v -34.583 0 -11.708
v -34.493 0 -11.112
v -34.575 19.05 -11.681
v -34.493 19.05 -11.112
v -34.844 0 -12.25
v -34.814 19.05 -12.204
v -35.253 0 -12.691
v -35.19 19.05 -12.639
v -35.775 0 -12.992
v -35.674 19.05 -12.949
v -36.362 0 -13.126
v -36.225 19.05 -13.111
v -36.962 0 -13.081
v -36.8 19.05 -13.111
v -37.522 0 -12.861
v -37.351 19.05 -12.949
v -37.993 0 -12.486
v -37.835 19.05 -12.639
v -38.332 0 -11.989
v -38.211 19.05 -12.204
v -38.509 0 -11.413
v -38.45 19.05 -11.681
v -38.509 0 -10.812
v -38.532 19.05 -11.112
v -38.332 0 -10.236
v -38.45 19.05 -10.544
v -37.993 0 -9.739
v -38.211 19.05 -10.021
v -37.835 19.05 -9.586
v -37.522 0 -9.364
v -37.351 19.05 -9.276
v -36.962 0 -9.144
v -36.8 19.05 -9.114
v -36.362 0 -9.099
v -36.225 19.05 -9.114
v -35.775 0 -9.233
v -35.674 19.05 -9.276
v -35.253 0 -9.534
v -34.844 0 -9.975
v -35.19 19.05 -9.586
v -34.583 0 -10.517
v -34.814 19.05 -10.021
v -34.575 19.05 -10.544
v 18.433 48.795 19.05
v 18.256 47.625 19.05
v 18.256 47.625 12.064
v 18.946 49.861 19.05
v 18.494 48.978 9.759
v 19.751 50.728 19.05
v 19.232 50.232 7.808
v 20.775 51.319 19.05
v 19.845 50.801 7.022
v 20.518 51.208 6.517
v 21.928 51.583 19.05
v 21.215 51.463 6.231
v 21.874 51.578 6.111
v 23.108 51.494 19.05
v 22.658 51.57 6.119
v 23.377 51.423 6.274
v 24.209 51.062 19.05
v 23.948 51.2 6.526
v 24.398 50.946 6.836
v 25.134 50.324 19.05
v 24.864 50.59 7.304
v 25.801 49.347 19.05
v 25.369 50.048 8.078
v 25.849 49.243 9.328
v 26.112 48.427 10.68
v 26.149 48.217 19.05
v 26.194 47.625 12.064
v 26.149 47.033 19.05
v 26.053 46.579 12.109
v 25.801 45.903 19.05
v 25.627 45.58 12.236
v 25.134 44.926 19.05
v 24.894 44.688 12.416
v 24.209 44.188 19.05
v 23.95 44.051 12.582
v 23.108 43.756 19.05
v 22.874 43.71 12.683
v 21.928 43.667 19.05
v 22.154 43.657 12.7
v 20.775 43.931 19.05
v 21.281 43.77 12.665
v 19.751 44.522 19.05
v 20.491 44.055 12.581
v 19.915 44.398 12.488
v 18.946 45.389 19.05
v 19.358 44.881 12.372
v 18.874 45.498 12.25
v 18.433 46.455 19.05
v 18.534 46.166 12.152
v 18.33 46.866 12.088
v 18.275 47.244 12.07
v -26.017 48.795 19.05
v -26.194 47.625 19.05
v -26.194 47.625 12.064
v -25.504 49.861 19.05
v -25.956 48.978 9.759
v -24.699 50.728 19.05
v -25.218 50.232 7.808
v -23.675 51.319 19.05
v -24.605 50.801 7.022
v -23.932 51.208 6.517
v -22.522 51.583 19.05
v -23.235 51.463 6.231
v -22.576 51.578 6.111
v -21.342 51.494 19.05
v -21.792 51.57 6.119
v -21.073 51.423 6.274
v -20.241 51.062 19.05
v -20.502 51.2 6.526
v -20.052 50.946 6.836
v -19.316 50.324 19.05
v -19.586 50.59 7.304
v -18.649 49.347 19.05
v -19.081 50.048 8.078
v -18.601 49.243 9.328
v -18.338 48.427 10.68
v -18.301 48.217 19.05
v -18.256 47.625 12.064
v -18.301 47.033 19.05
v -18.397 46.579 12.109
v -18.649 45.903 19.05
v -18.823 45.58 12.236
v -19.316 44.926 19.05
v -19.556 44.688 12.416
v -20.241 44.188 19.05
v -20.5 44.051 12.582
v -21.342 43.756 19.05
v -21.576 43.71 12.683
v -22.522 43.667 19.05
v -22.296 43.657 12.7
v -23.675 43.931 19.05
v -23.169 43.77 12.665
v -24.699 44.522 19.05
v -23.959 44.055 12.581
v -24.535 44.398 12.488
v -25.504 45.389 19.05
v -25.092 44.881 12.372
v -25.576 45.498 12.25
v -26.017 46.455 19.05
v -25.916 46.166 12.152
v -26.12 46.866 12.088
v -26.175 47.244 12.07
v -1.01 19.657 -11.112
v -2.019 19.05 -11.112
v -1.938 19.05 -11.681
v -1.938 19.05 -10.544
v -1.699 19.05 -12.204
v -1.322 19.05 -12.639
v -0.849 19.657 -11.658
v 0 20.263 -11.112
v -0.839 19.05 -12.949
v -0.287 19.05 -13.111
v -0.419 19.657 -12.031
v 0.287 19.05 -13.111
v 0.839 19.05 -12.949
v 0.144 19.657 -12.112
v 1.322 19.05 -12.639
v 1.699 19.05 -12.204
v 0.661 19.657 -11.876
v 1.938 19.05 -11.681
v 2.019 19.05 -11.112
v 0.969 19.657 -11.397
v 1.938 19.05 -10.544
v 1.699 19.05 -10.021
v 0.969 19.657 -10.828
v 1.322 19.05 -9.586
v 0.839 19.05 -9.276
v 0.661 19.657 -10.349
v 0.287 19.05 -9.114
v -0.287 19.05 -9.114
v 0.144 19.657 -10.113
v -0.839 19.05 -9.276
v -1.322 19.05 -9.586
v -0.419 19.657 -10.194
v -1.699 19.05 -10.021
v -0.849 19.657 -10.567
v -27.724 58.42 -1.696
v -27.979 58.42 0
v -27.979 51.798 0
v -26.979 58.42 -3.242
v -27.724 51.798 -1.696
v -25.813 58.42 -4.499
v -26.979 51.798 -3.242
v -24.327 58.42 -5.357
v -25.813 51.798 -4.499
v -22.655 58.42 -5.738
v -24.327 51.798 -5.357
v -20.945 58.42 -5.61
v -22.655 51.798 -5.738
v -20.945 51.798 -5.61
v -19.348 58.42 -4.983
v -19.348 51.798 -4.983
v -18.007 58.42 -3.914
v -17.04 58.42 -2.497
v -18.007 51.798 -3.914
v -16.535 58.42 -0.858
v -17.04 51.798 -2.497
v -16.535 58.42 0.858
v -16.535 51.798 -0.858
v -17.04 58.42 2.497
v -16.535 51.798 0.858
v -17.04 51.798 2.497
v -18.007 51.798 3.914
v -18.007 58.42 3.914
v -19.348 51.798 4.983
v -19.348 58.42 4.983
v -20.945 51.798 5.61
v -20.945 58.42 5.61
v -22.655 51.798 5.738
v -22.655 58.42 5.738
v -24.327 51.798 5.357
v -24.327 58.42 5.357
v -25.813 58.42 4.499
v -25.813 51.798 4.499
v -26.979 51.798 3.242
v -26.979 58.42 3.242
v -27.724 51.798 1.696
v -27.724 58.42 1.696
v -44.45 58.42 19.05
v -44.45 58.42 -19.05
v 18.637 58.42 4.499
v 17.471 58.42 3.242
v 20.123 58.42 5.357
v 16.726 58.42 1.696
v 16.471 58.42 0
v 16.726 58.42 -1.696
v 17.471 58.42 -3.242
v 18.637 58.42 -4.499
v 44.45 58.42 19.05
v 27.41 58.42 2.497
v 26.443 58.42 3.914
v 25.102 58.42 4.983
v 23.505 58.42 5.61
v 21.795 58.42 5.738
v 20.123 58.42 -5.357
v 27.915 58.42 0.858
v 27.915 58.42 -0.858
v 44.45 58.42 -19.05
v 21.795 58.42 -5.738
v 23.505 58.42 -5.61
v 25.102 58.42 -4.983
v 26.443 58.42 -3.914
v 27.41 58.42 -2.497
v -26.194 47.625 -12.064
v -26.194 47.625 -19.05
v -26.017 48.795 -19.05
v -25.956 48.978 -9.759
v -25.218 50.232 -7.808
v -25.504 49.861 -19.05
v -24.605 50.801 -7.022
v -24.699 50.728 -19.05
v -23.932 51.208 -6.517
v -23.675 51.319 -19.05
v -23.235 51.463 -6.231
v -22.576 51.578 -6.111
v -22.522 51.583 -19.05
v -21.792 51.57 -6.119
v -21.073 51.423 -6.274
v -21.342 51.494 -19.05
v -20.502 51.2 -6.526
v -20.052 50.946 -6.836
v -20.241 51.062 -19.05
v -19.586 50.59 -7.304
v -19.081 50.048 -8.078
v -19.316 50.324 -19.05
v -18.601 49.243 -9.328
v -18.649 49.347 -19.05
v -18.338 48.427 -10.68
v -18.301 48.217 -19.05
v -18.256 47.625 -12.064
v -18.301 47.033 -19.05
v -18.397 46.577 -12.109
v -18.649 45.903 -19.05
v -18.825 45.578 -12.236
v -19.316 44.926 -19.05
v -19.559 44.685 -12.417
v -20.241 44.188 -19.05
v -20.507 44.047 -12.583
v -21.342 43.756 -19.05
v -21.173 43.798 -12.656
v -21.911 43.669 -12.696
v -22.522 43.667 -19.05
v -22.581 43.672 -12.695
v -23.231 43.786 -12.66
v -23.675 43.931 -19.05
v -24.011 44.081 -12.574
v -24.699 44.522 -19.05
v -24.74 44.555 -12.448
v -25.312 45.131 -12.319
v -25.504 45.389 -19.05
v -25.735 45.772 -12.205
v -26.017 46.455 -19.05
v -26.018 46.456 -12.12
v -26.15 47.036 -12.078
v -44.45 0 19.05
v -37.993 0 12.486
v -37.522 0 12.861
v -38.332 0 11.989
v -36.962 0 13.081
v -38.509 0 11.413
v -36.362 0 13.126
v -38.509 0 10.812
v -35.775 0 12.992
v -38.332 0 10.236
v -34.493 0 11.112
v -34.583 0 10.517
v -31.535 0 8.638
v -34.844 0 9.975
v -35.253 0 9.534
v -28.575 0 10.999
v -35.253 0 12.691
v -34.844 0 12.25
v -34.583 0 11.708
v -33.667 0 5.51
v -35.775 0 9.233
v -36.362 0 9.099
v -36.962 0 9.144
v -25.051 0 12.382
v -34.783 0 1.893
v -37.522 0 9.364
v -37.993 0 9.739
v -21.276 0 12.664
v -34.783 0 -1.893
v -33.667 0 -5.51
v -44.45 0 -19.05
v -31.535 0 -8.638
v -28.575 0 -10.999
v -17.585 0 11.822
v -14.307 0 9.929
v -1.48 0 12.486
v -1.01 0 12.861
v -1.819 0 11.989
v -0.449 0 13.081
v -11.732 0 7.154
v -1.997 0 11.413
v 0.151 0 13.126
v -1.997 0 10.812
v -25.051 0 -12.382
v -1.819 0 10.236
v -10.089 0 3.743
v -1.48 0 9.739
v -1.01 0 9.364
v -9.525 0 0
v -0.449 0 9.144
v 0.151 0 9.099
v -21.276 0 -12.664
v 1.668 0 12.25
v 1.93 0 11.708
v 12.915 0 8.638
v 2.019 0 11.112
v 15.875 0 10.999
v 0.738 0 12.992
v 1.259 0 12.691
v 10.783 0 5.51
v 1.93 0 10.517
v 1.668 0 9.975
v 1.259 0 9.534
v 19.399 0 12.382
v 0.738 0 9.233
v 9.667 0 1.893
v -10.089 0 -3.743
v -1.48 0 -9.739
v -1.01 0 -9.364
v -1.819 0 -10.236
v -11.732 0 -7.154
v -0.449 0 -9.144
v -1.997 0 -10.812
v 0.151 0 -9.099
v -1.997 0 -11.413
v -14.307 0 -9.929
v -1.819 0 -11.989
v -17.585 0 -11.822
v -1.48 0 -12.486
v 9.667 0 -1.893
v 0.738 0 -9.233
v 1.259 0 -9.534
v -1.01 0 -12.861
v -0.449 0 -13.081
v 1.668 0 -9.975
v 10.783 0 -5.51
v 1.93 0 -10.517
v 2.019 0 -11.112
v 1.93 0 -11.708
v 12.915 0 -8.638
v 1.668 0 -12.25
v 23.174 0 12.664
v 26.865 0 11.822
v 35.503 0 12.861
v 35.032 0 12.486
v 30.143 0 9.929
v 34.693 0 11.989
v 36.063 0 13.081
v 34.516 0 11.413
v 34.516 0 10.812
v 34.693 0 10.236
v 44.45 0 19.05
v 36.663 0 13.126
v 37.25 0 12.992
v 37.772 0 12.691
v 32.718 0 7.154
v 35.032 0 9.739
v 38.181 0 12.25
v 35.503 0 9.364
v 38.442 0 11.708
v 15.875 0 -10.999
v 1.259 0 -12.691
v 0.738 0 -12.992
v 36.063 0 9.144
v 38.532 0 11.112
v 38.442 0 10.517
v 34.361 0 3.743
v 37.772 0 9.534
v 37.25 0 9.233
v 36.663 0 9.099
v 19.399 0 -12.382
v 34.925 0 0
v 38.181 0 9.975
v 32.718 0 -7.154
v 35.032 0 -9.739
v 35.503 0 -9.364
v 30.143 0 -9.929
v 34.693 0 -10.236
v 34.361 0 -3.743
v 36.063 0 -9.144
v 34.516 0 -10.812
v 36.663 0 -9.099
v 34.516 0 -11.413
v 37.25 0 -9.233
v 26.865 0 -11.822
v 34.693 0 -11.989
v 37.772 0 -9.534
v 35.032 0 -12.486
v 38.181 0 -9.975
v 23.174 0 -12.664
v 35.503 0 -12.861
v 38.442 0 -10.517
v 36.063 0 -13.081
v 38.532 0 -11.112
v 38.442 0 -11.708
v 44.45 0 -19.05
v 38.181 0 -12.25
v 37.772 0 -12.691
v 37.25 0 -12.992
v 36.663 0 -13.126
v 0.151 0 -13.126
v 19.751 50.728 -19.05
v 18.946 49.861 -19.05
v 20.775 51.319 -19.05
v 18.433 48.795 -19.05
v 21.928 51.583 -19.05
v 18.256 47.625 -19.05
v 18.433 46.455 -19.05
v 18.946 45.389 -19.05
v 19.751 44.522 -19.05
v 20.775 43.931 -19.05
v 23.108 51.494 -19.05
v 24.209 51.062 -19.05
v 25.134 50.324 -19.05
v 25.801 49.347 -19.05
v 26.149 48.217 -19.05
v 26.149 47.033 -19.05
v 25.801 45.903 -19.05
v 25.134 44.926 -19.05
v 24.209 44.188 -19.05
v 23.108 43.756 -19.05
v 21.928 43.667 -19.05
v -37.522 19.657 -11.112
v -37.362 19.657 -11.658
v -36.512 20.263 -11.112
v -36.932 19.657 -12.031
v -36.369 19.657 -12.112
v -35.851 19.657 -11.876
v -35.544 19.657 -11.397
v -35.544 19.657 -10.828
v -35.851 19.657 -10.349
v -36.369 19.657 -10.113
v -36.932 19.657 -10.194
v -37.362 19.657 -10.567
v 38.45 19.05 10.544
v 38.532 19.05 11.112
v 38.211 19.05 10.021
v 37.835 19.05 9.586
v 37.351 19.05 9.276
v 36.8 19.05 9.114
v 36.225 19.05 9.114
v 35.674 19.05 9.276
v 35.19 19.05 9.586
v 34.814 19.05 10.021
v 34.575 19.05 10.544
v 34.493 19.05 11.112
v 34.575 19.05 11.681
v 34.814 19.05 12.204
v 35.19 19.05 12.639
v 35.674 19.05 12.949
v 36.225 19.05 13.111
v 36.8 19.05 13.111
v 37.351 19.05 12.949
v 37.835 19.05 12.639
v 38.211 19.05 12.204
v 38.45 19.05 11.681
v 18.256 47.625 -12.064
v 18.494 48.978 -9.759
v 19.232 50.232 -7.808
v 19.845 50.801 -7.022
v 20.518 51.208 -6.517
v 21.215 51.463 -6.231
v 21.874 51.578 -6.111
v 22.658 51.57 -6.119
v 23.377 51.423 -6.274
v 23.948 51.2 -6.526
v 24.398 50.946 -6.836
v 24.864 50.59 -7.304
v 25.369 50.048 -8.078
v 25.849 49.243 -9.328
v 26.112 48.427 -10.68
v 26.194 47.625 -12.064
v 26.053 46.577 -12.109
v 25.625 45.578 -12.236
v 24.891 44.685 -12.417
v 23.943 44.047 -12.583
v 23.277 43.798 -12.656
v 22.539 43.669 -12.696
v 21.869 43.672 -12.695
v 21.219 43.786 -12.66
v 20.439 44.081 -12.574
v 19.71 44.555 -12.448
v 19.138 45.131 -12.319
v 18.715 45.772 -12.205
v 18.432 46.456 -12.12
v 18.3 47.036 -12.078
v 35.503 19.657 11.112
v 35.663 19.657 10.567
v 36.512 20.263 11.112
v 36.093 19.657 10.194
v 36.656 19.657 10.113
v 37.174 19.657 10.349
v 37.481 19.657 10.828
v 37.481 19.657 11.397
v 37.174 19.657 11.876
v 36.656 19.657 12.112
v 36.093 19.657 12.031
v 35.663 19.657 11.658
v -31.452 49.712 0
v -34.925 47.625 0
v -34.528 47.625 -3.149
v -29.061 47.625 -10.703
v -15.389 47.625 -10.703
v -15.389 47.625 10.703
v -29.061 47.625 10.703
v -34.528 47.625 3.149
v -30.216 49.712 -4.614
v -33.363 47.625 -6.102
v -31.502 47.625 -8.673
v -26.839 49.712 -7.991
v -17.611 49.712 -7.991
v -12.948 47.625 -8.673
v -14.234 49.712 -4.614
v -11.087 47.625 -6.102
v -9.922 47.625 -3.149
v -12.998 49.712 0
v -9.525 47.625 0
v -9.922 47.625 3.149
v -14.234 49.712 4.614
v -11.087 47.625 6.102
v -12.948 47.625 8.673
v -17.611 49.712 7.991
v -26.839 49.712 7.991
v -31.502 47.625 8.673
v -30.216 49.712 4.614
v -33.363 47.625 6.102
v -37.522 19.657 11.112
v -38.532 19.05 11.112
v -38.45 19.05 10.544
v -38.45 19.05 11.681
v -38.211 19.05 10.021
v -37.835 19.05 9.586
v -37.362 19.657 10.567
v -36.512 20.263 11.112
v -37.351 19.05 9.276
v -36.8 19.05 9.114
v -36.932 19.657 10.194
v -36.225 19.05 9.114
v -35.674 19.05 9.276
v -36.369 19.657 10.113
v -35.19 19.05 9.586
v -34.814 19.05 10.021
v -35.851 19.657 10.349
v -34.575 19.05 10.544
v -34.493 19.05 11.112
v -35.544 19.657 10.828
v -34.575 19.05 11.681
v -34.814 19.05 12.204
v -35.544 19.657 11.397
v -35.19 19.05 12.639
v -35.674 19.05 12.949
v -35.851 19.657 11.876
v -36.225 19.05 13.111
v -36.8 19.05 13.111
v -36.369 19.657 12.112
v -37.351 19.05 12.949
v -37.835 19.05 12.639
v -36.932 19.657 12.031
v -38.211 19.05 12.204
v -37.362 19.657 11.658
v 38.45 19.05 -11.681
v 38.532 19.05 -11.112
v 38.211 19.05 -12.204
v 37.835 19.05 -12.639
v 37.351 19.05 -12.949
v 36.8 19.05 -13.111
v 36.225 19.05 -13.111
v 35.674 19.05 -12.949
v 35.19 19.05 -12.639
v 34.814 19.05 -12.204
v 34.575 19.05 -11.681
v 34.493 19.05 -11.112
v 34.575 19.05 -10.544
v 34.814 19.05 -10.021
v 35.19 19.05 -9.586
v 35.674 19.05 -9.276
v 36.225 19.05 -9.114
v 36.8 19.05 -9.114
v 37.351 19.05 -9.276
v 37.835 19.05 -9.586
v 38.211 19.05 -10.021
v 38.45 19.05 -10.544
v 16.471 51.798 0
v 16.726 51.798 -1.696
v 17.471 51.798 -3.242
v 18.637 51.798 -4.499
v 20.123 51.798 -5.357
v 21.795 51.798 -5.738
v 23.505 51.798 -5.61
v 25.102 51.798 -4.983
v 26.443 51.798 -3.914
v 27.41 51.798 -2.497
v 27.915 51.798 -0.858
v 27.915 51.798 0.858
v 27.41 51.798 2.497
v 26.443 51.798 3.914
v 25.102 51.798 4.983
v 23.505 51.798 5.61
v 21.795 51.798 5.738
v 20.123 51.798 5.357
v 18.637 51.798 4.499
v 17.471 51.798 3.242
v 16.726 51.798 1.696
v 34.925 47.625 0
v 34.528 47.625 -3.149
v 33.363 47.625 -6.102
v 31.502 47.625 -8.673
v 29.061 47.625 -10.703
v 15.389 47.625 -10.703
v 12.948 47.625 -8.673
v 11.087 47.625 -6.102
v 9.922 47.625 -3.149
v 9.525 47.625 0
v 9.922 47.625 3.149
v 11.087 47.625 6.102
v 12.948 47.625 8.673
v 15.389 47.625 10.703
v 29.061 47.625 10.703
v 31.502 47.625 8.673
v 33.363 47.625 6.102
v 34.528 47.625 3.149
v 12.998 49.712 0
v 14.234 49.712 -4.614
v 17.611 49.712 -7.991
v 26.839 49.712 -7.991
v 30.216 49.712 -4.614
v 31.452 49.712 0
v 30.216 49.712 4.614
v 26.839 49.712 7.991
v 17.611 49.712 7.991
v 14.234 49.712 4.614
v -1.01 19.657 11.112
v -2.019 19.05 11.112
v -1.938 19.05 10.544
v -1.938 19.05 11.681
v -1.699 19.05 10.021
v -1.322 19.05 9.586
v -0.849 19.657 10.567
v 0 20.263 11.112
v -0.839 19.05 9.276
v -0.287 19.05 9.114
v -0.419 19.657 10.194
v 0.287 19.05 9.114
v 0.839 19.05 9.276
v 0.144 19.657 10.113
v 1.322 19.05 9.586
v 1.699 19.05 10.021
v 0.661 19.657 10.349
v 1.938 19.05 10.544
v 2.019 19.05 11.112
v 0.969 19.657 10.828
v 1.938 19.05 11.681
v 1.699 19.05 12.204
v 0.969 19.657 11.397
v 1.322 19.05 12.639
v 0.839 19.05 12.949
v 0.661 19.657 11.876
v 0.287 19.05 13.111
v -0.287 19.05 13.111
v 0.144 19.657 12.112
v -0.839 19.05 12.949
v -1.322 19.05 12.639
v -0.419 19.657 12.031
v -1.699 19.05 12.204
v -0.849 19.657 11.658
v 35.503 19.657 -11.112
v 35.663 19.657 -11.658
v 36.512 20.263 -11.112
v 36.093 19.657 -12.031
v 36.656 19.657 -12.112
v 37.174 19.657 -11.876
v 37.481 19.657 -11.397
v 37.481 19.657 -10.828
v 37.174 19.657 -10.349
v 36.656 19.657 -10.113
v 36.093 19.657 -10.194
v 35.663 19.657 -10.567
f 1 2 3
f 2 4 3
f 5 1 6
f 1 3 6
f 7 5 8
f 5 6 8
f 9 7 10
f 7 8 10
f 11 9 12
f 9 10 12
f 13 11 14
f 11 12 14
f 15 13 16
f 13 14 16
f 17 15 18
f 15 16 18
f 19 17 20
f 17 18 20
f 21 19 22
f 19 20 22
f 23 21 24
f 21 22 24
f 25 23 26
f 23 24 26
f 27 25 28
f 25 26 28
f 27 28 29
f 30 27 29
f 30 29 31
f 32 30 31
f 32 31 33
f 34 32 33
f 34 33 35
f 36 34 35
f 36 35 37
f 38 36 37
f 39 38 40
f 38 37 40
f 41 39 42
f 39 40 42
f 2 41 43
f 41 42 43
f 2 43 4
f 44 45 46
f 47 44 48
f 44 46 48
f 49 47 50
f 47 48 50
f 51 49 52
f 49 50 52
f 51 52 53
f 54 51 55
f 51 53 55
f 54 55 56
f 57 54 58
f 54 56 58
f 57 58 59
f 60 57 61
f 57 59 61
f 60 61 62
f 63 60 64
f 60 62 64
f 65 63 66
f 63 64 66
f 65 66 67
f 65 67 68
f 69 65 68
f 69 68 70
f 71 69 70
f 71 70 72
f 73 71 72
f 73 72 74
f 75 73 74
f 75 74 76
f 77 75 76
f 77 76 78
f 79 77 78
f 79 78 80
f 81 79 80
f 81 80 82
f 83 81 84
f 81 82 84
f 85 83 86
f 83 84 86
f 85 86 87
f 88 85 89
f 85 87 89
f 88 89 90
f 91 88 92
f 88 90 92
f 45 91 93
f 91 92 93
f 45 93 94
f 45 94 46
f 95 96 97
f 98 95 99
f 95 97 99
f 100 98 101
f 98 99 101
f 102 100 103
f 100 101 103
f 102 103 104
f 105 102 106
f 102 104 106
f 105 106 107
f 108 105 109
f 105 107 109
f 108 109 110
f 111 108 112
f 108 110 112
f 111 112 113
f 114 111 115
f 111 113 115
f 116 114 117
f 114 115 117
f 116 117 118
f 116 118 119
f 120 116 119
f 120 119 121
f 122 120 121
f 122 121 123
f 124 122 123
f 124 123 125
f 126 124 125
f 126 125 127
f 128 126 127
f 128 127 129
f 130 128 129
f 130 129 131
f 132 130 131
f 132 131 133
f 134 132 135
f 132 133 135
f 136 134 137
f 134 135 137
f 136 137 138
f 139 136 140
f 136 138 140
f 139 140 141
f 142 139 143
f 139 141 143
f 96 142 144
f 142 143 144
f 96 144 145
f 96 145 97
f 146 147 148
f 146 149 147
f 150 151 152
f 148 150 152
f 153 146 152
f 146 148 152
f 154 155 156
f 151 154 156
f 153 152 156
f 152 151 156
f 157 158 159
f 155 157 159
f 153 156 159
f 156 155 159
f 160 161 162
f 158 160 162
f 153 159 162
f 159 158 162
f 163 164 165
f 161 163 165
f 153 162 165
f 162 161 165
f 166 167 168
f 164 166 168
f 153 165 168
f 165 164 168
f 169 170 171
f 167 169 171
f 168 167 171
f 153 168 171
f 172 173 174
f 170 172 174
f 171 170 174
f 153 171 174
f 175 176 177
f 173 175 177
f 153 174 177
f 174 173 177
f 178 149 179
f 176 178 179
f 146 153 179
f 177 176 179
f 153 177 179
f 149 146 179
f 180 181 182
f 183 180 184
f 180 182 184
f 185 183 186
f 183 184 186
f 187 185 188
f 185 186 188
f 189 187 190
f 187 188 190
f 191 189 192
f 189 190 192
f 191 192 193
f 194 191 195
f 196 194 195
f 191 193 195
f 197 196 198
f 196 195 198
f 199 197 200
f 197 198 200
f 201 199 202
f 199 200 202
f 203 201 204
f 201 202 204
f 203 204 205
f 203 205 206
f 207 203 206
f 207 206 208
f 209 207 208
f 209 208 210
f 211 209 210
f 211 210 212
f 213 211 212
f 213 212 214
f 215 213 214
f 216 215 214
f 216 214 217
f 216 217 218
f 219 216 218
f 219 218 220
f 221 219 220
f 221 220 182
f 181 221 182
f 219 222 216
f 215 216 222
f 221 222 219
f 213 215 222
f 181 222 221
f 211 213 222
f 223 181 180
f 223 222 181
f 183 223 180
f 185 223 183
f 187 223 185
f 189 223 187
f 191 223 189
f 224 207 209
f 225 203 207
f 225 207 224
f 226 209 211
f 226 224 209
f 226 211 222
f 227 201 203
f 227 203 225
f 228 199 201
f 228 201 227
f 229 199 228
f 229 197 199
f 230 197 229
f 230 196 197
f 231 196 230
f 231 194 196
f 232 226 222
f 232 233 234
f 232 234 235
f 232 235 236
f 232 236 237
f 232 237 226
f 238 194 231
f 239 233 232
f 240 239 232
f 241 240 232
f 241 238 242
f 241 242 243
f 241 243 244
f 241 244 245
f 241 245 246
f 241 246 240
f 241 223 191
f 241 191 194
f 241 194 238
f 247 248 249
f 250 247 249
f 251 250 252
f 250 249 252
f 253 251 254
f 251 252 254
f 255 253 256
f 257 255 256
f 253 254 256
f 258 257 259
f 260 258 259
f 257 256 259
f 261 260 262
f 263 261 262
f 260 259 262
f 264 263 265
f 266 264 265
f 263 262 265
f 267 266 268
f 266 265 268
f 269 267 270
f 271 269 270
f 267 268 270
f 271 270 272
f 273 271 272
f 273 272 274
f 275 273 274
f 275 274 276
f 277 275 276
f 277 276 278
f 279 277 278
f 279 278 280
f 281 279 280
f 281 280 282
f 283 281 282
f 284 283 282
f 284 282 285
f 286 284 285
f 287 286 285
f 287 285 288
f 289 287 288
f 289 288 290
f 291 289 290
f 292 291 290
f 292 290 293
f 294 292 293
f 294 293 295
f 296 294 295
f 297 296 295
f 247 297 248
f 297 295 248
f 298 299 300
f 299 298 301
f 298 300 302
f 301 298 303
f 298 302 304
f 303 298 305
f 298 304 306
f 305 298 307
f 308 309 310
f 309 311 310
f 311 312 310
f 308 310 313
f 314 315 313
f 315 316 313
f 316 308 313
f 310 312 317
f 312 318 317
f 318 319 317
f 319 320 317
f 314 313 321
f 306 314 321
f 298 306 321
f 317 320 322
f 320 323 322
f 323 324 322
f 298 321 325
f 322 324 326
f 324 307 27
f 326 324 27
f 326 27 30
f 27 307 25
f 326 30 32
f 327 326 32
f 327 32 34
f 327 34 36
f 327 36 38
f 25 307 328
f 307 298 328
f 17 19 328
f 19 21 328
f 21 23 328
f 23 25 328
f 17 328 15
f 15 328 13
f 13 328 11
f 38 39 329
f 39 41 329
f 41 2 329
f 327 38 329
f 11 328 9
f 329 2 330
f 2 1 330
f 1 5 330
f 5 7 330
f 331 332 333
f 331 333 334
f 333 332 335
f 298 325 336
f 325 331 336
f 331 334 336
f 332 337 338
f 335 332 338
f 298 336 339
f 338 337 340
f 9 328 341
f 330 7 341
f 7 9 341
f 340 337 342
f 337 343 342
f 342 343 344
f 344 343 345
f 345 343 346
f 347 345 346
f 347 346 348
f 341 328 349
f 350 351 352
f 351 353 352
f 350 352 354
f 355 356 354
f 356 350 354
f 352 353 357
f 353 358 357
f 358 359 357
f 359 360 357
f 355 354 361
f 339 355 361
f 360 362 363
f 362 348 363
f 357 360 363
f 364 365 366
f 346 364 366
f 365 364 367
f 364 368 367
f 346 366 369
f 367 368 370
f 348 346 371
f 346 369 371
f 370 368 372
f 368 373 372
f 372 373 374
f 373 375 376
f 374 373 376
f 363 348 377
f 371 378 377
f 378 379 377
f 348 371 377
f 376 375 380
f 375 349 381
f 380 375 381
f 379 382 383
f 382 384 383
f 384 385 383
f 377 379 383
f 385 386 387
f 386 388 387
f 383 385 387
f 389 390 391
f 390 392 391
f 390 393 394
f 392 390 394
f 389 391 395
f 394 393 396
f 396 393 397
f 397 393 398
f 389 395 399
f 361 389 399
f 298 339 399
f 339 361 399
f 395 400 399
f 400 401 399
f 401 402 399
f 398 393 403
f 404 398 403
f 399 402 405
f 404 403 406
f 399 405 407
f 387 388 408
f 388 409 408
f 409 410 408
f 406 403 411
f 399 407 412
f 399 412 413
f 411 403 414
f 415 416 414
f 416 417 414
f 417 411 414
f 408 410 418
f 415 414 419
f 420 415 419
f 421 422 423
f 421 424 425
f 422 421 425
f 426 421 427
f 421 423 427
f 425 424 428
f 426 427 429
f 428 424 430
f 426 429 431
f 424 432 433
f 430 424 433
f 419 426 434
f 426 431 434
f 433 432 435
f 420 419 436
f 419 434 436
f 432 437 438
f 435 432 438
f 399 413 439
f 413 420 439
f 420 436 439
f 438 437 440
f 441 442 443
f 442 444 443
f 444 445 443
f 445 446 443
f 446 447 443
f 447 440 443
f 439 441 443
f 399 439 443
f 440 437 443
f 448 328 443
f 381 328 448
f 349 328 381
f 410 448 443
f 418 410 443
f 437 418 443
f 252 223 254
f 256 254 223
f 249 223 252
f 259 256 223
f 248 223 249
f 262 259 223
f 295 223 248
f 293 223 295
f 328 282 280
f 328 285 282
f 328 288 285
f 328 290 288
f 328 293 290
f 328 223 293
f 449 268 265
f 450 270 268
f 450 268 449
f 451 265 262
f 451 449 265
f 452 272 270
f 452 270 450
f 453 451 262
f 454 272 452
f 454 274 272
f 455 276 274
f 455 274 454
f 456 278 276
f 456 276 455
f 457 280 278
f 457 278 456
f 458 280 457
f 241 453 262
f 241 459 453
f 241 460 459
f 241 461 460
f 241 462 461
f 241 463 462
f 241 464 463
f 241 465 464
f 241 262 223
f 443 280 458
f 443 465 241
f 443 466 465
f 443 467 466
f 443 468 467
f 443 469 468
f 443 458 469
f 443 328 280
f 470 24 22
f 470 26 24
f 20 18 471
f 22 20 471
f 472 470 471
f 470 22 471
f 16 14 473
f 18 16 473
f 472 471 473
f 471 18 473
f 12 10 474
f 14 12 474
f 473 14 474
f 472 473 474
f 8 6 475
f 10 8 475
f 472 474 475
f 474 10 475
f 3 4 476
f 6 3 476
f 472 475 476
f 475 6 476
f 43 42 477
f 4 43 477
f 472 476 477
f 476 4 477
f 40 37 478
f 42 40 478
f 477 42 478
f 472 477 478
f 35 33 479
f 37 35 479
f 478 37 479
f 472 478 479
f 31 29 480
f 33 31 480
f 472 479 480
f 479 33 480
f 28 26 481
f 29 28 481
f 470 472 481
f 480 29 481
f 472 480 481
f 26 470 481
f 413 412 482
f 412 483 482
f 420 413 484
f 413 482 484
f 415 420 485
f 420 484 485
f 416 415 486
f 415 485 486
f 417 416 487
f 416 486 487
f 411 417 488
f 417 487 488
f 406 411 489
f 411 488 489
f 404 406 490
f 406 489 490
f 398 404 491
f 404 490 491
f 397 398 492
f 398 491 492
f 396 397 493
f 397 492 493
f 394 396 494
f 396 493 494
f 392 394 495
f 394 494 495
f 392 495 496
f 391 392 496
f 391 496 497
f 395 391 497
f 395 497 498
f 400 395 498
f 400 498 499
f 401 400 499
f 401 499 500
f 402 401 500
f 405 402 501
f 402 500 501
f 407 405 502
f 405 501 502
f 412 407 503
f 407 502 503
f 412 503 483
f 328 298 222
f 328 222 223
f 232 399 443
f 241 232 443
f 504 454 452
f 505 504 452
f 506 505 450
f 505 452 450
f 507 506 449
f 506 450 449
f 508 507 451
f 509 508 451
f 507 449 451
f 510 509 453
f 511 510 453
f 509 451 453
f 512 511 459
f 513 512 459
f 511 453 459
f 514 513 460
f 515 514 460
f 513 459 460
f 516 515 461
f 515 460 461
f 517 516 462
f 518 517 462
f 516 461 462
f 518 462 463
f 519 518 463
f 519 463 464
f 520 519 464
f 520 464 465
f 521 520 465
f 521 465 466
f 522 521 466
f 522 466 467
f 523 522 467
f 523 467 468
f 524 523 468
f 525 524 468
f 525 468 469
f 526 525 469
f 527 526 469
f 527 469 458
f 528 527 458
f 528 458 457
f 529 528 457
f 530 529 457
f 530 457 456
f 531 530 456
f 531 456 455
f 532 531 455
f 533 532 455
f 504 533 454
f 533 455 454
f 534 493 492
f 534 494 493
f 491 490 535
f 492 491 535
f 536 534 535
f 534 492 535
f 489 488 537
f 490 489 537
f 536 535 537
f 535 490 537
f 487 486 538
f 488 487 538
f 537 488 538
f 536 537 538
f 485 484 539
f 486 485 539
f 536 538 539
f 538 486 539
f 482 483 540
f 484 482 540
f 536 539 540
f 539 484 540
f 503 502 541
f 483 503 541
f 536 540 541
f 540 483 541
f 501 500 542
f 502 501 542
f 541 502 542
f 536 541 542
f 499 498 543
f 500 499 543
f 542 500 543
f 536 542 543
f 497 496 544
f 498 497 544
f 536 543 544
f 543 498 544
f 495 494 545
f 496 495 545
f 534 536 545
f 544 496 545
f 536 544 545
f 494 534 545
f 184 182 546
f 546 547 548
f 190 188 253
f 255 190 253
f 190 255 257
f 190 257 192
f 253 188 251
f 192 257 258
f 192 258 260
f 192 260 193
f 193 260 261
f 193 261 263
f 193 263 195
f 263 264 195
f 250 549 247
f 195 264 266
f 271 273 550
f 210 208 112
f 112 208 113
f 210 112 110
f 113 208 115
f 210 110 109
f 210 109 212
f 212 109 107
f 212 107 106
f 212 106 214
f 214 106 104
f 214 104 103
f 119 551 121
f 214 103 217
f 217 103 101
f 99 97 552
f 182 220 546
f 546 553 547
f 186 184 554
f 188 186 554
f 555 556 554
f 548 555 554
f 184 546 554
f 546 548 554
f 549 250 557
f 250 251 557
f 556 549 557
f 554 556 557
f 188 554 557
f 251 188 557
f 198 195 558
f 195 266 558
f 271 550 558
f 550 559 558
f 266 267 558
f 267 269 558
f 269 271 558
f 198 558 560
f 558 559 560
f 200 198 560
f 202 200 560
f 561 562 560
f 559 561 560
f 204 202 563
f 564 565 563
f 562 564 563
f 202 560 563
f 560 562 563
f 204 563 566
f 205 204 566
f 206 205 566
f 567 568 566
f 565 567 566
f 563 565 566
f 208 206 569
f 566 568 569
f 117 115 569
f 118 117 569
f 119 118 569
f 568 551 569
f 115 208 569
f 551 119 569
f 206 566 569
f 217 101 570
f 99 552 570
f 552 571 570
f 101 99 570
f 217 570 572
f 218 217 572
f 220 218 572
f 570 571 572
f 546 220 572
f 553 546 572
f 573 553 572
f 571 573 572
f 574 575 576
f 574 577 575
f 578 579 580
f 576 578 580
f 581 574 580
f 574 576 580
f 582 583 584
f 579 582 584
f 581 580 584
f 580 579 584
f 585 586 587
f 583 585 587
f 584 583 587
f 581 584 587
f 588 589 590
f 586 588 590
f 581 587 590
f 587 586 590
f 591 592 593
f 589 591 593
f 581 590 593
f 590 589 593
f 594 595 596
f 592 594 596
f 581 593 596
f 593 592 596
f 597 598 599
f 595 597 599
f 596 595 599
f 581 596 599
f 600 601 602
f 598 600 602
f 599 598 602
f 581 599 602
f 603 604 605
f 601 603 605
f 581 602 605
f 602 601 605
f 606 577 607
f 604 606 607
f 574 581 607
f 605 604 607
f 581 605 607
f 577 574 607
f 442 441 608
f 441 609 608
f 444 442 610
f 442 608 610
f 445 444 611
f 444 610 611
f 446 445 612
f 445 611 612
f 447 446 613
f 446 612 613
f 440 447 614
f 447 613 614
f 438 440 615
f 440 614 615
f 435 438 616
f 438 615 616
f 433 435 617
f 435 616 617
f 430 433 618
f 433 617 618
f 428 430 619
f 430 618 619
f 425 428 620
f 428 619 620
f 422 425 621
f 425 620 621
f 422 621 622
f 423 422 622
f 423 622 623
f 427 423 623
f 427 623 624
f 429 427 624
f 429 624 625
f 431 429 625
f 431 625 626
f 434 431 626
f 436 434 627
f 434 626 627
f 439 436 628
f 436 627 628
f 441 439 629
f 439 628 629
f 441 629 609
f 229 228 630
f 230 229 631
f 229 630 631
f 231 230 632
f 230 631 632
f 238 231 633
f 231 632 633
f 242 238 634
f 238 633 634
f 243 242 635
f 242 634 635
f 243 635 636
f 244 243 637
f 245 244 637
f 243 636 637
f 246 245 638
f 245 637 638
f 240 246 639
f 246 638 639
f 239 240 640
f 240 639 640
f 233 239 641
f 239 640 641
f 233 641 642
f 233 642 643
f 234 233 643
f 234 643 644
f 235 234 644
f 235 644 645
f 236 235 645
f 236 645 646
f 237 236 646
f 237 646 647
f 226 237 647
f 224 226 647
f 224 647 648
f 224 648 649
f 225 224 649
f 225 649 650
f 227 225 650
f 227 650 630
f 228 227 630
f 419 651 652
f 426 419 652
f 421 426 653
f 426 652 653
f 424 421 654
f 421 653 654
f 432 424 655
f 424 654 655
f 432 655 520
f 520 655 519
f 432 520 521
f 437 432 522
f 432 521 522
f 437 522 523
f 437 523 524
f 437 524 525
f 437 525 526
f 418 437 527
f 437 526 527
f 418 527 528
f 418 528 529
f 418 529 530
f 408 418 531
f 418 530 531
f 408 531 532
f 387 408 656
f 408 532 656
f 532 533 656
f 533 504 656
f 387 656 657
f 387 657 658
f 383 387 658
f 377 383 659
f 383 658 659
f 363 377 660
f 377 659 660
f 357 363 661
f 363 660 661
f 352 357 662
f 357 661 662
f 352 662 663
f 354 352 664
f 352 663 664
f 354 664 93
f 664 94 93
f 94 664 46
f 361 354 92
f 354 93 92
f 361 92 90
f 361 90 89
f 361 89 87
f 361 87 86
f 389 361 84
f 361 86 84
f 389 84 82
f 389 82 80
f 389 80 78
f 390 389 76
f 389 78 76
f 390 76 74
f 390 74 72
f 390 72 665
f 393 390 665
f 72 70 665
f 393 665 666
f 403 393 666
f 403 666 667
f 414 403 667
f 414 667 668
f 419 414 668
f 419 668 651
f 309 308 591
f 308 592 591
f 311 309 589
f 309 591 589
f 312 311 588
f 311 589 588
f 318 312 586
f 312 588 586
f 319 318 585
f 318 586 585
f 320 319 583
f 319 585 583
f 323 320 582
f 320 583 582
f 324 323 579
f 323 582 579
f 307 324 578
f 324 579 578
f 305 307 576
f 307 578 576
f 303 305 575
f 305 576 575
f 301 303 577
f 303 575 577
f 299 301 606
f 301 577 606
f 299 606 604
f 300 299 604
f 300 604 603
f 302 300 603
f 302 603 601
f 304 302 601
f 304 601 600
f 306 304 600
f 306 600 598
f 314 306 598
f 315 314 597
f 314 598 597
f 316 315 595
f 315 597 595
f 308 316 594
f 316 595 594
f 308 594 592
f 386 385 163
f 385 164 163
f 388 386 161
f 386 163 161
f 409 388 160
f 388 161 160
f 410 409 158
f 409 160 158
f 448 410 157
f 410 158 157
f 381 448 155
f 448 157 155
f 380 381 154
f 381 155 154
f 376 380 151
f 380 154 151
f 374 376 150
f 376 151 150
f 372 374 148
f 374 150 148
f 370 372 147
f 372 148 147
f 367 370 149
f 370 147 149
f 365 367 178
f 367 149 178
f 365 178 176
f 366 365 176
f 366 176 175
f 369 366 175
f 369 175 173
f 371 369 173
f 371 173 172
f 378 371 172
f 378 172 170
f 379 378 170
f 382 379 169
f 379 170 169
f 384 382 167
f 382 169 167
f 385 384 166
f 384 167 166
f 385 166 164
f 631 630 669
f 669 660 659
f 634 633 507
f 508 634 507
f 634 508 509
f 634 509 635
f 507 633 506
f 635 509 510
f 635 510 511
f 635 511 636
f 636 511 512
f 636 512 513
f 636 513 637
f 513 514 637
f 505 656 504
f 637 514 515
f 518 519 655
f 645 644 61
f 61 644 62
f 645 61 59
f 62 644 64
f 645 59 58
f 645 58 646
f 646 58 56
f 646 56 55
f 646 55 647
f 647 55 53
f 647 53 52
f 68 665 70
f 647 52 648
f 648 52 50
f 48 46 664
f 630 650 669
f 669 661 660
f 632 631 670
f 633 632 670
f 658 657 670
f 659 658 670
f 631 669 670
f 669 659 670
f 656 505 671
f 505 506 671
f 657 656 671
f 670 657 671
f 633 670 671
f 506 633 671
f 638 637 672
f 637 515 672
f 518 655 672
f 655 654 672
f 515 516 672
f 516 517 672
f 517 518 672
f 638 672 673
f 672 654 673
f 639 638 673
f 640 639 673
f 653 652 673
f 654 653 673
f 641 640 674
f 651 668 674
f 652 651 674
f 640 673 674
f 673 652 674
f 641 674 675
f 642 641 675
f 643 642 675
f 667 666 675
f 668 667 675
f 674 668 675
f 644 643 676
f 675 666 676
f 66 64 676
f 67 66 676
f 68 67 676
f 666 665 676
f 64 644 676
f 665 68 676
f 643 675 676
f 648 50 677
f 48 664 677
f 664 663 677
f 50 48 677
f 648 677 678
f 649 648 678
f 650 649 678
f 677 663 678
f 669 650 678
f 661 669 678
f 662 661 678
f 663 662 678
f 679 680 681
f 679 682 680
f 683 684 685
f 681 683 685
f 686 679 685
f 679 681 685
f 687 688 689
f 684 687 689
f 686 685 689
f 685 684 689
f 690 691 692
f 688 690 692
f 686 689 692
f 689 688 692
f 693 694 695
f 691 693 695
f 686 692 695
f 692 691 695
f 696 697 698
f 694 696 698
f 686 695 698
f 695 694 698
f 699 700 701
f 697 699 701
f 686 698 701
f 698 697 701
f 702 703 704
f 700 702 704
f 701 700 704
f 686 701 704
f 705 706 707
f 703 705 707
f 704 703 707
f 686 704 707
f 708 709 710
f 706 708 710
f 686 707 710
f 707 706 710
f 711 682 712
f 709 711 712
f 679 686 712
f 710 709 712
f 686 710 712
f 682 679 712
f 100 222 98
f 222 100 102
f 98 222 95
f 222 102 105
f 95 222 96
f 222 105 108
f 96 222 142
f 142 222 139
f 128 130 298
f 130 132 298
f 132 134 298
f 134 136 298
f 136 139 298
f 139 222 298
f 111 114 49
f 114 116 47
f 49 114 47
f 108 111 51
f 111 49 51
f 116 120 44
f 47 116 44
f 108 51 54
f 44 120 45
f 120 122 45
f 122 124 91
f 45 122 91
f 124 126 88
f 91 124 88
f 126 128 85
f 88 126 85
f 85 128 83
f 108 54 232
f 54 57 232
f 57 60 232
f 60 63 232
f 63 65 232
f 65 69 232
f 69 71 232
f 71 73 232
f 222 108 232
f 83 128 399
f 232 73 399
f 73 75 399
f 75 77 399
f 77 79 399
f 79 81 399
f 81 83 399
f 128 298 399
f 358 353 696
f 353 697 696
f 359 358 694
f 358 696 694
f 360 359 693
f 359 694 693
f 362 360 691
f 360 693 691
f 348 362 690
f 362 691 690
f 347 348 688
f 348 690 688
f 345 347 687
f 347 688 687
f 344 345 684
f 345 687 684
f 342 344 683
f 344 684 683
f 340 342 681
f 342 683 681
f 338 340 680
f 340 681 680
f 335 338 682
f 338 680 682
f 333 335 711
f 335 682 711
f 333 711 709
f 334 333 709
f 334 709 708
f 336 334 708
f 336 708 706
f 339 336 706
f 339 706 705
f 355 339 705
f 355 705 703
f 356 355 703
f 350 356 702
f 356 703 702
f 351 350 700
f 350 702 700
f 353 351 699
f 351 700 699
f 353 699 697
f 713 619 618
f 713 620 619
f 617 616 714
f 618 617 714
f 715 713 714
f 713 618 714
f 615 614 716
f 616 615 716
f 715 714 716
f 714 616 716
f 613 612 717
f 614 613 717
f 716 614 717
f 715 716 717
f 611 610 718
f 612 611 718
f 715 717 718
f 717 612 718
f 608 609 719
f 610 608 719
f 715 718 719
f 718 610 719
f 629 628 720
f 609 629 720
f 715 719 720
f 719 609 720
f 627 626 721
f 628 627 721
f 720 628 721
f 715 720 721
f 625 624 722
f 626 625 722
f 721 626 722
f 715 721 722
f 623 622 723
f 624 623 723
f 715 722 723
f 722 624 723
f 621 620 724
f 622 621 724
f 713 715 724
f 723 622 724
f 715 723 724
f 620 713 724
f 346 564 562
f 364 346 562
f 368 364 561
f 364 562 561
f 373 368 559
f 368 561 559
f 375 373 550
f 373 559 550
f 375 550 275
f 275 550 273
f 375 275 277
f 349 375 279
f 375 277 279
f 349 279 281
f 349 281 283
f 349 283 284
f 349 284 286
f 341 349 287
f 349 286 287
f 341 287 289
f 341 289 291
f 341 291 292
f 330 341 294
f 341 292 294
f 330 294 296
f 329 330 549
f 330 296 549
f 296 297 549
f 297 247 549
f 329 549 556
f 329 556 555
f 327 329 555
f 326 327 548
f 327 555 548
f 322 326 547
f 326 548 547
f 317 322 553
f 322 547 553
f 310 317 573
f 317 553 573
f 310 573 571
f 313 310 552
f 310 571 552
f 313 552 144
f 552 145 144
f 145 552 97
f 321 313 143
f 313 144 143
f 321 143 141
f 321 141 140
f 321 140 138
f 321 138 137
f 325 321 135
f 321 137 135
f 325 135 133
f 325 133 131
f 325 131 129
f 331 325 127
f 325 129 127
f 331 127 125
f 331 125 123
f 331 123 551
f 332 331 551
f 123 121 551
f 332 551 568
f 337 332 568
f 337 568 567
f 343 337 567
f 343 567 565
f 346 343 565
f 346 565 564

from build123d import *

# Parameters (mm, degrees)
SKETCH1_W                  = 88.9
SKETCH1_H                  = 38.1
BLOCK_DEPTH                = 58.42
SPRING_BORES_D             = 25.4
SPRING_BORES_DEPTH         = 47.625
SPRING_BORES_TIP           = 7.630929862
F_1_2_20_TAPPED_HOLES_D    = 11.50874
VIEW_HOLES_D               = 7.9375
F_10_32_TAPPED_HOLES_D     = 4.0386
F_10_32_TAPPED_HOLES_DEPTH = 19.05
F_10_32_TAPPED_HOLES_TIP   = 1.213317848


with BuildPart() as part:
    # Sketch1 → Block (new body)
    with BuildSketch(Plane(origin=(0, 0, 0), x_dir=(1, 0, 0), z_dir=(0, 1, 0))):
        Rectangle(SKETCH1_W, SKETCH1_H)
    extrude(amount=BLOCK_DEPTH)

    # Spring Bores
    with Locations(Plane(origin=(0, 0, 0), x_dir=(-1, 0, 0), z_dir=(0, -1, 0))):
        with Locations((22.225, 0), (-22.225, 0)):
            Hole(SPRING_BORES_D / 2, depth=SPRING_BORES_DEPTH)
            with Locations((0, 0, -(SPRING_BORES_DEPTH + SPRING_BORES_TIP / 2))):  # 118° drill point
                Cone(0, SPRING_BORES_D / 2, SPRING_BORES_TIP, mode=Mode.SUBTRACT)

    # 1/2-20 Tapped Holes (through all)
    with Locations(Plane(origin=(0, 58.42, 0), x_dir=(1, 0, 0), z_dir=(0, 1, 0))):
        with Locations((-22.225, 0), (22.225, 0)):
            Hole(F_1_2_20_TAPPED_HOLES_D / 2)

    # View Holes (through all)
    with Locations(Plane.XY.offset(19.05)):
        with Locations((-22.225, 47.625), (22.225, 47.625)):
            Hole(VIEW_HOLES_D / 2)

    # #10-32 Tapped Holes
    with Locations(Plane(origin=(0, 0, 0), x_dir=(-1, 0, 0), z_dir=(0, -1, 0))):
        with Locations((0, -11.1125), (0, 11.1125), (36.5125, -11.1125), (36.5125, 11.1125), (-36.5125, 11.1125), (-36.5125, -11.1125)):
            Hole(F_10_32_TAPPED_HOLES_D / 2, depth=F_10_32_TAPPED_HOLES_DEPTH)
            with Locations((0, 0, -(F_10_32_TAPPED_HOLES_DEPTH + F_10_32_TAPPED_HOLES_TIP / 2))):  # 118° drill point
                Cone(0, F_10_32_TAPPED_HOLES_D / 2, F_10_32_TAPPED_HOLES_TIP, mode=Mode.SUBTRACT)


solid = part.part
